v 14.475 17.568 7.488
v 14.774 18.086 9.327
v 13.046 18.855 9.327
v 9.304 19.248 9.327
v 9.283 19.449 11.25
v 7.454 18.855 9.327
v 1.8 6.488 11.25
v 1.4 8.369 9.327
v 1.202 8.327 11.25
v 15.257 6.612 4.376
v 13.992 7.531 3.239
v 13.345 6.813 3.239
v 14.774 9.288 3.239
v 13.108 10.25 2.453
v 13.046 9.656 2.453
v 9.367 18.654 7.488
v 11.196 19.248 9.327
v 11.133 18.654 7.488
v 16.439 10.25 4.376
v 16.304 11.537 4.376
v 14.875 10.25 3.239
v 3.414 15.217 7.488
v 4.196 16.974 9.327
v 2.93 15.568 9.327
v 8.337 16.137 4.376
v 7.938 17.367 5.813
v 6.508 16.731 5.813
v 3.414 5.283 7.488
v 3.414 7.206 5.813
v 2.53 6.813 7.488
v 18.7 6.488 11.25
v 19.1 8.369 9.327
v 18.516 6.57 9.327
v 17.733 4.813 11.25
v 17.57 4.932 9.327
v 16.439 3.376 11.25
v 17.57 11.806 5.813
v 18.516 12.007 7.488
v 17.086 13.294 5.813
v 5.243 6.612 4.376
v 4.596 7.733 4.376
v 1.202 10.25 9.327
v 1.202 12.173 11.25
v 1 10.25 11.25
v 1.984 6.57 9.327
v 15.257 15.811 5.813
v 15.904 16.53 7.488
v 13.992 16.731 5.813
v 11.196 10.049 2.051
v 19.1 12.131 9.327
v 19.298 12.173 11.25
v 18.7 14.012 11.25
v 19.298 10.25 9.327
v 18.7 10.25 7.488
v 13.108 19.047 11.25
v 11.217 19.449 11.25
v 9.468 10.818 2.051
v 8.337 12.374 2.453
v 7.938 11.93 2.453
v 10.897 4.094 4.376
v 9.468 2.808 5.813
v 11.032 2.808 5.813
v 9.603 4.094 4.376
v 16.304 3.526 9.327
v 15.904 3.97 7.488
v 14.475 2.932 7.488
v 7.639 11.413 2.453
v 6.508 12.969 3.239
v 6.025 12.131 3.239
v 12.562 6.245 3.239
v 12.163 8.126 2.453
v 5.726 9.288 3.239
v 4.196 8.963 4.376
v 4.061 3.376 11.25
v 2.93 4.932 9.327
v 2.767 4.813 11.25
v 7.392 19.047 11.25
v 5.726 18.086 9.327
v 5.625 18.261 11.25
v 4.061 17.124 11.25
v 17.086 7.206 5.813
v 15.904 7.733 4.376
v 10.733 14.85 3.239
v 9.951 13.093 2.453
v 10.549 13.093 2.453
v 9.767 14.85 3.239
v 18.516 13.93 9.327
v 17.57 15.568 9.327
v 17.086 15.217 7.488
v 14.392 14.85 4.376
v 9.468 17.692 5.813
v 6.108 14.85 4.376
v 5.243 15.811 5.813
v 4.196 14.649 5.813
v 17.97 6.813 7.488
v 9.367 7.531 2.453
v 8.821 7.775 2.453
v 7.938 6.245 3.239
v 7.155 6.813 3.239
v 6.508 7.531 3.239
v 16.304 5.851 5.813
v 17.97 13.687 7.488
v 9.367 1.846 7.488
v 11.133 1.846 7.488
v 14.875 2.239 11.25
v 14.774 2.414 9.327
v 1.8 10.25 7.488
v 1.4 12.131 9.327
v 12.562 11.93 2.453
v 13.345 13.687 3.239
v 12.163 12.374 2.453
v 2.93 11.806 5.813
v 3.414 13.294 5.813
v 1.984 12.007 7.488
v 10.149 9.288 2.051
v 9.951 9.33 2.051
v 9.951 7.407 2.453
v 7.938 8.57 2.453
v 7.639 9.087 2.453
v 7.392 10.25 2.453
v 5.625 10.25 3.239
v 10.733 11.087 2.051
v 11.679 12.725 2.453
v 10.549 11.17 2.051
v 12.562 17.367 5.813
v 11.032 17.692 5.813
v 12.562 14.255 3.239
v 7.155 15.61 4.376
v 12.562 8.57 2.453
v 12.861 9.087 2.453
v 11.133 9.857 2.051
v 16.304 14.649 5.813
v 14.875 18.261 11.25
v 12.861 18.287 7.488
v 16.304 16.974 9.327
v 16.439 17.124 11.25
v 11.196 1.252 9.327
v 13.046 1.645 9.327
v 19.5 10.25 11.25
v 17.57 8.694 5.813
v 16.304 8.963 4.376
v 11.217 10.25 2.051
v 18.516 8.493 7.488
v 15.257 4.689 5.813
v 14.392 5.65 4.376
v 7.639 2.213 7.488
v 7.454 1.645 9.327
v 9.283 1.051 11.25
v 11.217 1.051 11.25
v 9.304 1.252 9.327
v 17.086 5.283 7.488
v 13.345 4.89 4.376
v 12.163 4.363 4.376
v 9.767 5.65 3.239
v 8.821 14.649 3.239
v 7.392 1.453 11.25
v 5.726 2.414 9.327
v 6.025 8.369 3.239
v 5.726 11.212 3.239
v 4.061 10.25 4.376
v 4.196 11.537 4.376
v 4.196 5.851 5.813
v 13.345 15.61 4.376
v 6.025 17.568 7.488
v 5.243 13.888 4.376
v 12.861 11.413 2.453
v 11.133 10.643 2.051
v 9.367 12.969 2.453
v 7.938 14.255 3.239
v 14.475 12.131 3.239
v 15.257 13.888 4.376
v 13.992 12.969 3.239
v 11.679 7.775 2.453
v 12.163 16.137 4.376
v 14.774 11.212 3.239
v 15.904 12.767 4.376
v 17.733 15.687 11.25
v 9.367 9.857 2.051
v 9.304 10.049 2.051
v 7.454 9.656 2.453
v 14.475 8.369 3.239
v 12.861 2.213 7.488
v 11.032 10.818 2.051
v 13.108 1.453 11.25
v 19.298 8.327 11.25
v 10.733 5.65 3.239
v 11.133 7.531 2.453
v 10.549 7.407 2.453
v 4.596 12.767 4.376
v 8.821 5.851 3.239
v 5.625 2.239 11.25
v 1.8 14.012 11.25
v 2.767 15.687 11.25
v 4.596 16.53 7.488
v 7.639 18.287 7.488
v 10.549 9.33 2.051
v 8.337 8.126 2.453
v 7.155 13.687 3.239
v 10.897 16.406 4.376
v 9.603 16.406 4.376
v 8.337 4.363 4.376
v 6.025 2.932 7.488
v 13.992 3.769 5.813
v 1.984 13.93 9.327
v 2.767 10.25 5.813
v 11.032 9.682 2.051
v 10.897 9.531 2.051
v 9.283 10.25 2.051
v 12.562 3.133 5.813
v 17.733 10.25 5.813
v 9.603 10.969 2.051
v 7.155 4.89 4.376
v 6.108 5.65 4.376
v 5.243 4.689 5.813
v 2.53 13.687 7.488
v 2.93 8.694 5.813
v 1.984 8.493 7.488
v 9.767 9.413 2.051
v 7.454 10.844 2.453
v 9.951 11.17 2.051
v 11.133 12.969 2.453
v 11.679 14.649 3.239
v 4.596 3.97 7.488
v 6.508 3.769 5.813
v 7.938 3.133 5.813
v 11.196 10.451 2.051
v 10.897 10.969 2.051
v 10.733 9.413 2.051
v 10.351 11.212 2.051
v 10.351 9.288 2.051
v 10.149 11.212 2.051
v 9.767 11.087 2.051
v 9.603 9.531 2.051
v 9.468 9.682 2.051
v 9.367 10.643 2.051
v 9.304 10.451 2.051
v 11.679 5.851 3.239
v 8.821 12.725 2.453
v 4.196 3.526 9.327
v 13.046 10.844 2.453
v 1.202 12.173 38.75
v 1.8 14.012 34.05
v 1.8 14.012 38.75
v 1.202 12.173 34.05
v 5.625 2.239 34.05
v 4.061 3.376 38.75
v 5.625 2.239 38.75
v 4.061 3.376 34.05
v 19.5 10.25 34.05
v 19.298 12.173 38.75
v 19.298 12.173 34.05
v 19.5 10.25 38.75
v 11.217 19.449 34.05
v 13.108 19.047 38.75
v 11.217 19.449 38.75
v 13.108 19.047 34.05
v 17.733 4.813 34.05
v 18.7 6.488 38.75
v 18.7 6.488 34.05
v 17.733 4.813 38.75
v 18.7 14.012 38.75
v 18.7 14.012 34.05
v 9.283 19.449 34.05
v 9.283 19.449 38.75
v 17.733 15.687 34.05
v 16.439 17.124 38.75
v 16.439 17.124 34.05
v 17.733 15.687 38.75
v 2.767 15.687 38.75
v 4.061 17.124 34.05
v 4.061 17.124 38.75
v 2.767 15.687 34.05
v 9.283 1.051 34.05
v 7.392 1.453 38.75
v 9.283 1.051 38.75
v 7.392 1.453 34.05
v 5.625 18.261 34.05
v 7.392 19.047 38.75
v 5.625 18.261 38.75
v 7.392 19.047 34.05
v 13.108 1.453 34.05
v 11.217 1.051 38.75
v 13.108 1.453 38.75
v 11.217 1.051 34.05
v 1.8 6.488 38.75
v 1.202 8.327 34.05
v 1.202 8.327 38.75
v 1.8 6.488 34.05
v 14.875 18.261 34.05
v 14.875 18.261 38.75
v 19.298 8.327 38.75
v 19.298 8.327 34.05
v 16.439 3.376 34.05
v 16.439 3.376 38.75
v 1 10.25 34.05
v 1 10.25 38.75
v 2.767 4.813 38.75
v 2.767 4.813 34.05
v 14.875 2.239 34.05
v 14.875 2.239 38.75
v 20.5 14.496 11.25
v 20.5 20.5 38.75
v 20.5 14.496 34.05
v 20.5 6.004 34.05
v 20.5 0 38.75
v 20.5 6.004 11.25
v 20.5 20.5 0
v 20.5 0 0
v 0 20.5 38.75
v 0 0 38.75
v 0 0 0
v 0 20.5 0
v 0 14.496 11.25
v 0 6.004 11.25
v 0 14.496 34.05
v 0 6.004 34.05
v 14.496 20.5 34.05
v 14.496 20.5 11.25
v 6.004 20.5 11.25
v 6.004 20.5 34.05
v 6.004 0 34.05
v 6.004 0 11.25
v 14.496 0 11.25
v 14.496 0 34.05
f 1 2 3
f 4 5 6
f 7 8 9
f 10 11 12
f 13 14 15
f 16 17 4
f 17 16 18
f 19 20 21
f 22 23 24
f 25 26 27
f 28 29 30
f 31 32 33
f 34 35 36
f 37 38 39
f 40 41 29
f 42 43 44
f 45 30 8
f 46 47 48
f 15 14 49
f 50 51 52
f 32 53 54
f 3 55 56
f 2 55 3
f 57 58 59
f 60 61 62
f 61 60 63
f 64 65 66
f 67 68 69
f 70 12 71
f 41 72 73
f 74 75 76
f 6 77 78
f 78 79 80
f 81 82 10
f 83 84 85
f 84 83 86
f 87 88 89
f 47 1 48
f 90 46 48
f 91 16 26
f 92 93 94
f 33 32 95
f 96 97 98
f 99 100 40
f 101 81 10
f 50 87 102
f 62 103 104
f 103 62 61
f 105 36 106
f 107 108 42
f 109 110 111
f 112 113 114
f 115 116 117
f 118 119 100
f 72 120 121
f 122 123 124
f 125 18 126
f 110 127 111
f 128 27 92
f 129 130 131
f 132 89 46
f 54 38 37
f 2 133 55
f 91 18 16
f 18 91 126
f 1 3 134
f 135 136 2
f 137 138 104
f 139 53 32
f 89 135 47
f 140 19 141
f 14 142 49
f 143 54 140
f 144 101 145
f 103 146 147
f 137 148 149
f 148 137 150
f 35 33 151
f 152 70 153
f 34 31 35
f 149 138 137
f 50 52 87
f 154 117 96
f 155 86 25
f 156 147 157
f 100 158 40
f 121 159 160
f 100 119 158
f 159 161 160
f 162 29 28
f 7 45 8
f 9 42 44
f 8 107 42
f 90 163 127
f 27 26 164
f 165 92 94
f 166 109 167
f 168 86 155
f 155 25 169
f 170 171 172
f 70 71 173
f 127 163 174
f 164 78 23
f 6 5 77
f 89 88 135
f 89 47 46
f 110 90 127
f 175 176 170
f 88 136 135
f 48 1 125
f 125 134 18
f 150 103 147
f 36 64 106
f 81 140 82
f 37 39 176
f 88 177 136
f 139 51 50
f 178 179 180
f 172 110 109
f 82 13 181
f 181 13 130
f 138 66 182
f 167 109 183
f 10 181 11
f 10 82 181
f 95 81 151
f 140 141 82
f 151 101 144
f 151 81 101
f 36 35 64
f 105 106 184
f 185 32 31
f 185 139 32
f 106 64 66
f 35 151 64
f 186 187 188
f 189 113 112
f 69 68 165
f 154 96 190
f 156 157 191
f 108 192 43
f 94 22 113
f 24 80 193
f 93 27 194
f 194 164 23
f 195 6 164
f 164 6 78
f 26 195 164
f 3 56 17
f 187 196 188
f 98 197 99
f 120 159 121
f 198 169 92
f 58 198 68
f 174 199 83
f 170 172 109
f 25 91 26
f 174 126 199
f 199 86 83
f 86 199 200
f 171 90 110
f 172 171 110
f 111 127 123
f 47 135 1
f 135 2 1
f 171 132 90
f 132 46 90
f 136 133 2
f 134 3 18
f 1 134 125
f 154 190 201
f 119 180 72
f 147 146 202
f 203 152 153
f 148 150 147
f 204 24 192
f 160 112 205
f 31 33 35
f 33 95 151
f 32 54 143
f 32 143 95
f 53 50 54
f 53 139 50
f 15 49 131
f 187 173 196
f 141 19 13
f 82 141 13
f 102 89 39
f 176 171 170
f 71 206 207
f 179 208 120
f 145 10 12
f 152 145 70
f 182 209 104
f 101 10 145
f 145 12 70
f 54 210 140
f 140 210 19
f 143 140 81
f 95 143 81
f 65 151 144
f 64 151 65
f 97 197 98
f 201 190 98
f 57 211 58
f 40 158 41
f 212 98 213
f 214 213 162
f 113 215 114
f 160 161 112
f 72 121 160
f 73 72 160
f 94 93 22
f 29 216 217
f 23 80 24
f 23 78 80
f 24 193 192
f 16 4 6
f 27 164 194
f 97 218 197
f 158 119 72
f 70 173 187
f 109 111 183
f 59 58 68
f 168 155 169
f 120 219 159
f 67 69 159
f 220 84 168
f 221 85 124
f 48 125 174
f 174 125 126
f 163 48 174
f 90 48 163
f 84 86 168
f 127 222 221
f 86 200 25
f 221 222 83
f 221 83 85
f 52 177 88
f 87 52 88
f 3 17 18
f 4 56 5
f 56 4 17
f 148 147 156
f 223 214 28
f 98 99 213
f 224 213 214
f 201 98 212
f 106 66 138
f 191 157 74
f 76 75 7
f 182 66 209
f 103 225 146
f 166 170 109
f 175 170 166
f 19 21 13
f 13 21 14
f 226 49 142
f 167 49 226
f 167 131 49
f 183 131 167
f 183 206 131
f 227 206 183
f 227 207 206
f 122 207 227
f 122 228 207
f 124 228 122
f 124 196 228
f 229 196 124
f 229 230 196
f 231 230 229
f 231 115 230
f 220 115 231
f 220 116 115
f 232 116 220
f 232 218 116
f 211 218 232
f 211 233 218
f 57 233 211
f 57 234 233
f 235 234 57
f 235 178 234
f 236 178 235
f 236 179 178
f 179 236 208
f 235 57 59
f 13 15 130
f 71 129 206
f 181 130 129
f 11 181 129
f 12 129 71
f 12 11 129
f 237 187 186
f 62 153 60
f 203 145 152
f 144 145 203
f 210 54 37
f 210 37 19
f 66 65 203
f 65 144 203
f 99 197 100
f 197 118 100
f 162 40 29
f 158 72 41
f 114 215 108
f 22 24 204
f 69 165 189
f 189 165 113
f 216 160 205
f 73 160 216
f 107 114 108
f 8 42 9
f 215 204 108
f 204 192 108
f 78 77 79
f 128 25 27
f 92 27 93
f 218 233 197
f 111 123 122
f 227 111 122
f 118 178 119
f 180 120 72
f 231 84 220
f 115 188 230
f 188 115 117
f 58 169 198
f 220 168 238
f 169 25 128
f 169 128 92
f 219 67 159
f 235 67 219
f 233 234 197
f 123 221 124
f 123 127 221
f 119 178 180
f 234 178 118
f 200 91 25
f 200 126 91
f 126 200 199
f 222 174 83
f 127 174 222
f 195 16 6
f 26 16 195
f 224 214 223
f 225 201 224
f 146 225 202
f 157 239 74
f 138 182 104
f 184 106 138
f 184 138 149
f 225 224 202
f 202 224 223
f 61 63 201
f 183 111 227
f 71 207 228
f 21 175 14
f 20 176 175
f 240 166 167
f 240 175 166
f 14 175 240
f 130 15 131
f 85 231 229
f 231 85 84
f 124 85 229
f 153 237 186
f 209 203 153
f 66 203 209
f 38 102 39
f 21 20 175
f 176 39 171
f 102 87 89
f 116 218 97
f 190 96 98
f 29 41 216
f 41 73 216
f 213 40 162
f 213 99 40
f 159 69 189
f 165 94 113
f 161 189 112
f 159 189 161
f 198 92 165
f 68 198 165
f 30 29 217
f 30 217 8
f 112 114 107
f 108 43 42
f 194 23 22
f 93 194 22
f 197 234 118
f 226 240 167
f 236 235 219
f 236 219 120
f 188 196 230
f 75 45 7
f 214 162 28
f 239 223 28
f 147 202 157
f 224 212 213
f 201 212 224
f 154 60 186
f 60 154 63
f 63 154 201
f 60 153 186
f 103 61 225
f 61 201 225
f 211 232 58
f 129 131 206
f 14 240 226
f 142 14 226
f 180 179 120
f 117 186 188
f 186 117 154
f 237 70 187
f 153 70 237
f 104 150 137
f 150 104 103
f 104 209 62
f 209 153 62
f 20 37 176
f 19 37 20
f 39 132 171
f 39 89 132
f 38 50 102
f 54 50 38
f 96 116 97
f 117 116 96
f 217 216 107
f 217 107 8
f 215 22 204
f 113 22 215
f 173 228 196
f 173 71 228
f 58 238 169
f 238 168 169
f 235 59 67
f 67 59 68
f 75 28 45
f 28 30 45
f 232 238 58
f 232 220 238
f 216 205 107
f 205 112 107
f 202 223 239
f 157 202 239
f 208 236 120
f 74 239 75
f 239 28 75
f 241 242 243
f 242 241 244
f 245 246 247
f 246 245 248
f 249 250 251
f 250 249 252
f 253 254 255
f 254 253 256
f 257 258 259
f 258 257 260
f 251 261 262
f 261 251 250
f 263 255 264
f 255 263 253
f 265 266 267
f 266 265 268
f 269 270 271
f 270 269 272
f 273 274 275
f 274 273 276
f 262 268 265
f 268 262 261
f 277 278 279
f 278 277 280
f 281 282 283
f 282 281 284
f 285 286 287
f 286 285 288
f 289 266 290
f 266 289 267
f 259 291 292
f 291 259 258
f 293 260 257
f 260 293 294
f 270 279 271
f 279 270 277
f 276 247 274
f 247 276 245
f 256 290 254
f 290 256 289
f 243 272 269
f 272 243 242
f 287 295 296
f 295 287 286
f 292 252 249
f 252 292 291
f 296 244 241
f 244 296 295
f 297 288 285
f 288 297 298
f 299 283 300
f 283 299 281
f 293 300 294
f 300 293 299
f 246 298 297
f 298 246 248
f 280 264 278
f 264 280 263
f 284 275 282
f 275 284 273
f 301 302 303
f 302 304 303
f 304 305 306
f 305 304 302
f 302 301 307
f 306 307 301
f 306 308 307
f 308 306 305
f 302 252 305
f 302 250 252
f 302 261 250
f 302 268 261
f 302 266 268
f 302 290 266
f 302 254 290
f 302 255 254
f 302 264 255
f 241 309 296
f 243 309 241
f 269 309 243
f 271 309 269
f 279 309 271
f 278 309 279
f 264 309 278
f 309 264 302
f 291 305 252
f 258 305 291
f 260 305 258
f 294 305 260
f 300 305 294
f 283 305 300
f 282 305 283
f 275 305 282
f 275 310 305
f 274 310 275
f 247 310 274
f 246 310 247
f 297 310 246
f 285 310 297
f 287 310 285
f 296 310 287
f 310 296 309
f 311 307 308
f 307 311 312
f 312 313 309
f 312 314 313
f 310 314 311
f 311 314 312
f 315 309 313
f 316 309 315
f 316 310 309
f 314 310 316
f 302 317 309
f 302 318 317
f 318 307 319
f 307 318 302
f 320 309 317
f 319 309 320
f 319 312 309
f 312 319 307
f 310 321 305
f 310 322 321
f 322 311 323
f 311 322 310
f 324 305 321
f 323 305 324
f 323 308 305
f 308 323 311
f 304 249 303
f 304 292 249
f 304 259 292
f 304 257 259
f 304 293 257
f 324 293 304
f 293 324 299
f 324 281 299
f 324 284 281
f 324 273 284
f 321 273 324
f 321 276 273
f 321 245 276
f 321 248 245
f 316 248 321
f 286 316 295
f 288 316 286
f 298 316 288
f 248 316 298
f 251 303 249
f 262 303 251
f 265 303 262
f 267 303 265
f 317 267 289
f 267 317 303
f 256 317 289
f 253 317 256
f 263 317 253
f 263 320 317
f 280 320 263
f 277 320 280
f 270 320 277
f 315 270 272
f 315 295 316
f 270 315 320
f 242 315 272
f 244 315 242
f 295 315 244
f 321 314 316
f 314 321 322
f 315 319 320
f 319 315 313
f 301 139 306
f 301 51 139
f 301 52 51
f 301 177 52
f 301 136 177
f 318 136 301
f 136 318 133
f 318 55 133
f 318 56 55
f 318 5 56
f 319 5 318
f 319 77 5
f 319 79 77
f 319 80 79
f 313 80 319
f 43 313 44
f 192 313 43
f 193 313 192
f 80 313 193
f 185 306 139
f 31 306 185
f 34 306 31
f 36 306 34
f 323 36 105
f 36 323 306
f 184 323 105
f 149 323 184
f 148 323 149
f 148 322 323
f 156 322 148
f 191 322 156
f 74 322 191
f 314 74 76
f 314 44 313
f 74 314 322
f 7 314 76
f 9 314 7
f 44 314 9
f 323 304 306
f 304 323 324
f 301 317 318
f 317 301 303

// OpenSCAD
rows = 1;
columns = 1;
radius = 9.25;
height = 38 * 0.75;
depth = height + radius;
offset = 1;
slotsize = (radius+offset)*2;
zpad = 1;

for (row = [0:rows-1])
    for (column = [0:columns-1])
        translate([column*slotsize,row*slotsize,0]) slot();

module hole() {
    translate([radius,radius,radius]) sphere(radius);
    translate([radius,radius,radius]) cylinder(height,radius,radius);
}

module slot() {
    slotside = (radius+offset) * 2;
    difference() {
        cube([slotsize,slotsize,radius+height+offset]);
        translate([offset,offset,offset+zpad]) hole();
        translate([slotside/2,-(((slotside*sqrt(2))-slotside)/2),offset+zpad+radius]) rotate([0,0,45])  cube([slotsize,slotsize,height*.8]);
    }
}    
